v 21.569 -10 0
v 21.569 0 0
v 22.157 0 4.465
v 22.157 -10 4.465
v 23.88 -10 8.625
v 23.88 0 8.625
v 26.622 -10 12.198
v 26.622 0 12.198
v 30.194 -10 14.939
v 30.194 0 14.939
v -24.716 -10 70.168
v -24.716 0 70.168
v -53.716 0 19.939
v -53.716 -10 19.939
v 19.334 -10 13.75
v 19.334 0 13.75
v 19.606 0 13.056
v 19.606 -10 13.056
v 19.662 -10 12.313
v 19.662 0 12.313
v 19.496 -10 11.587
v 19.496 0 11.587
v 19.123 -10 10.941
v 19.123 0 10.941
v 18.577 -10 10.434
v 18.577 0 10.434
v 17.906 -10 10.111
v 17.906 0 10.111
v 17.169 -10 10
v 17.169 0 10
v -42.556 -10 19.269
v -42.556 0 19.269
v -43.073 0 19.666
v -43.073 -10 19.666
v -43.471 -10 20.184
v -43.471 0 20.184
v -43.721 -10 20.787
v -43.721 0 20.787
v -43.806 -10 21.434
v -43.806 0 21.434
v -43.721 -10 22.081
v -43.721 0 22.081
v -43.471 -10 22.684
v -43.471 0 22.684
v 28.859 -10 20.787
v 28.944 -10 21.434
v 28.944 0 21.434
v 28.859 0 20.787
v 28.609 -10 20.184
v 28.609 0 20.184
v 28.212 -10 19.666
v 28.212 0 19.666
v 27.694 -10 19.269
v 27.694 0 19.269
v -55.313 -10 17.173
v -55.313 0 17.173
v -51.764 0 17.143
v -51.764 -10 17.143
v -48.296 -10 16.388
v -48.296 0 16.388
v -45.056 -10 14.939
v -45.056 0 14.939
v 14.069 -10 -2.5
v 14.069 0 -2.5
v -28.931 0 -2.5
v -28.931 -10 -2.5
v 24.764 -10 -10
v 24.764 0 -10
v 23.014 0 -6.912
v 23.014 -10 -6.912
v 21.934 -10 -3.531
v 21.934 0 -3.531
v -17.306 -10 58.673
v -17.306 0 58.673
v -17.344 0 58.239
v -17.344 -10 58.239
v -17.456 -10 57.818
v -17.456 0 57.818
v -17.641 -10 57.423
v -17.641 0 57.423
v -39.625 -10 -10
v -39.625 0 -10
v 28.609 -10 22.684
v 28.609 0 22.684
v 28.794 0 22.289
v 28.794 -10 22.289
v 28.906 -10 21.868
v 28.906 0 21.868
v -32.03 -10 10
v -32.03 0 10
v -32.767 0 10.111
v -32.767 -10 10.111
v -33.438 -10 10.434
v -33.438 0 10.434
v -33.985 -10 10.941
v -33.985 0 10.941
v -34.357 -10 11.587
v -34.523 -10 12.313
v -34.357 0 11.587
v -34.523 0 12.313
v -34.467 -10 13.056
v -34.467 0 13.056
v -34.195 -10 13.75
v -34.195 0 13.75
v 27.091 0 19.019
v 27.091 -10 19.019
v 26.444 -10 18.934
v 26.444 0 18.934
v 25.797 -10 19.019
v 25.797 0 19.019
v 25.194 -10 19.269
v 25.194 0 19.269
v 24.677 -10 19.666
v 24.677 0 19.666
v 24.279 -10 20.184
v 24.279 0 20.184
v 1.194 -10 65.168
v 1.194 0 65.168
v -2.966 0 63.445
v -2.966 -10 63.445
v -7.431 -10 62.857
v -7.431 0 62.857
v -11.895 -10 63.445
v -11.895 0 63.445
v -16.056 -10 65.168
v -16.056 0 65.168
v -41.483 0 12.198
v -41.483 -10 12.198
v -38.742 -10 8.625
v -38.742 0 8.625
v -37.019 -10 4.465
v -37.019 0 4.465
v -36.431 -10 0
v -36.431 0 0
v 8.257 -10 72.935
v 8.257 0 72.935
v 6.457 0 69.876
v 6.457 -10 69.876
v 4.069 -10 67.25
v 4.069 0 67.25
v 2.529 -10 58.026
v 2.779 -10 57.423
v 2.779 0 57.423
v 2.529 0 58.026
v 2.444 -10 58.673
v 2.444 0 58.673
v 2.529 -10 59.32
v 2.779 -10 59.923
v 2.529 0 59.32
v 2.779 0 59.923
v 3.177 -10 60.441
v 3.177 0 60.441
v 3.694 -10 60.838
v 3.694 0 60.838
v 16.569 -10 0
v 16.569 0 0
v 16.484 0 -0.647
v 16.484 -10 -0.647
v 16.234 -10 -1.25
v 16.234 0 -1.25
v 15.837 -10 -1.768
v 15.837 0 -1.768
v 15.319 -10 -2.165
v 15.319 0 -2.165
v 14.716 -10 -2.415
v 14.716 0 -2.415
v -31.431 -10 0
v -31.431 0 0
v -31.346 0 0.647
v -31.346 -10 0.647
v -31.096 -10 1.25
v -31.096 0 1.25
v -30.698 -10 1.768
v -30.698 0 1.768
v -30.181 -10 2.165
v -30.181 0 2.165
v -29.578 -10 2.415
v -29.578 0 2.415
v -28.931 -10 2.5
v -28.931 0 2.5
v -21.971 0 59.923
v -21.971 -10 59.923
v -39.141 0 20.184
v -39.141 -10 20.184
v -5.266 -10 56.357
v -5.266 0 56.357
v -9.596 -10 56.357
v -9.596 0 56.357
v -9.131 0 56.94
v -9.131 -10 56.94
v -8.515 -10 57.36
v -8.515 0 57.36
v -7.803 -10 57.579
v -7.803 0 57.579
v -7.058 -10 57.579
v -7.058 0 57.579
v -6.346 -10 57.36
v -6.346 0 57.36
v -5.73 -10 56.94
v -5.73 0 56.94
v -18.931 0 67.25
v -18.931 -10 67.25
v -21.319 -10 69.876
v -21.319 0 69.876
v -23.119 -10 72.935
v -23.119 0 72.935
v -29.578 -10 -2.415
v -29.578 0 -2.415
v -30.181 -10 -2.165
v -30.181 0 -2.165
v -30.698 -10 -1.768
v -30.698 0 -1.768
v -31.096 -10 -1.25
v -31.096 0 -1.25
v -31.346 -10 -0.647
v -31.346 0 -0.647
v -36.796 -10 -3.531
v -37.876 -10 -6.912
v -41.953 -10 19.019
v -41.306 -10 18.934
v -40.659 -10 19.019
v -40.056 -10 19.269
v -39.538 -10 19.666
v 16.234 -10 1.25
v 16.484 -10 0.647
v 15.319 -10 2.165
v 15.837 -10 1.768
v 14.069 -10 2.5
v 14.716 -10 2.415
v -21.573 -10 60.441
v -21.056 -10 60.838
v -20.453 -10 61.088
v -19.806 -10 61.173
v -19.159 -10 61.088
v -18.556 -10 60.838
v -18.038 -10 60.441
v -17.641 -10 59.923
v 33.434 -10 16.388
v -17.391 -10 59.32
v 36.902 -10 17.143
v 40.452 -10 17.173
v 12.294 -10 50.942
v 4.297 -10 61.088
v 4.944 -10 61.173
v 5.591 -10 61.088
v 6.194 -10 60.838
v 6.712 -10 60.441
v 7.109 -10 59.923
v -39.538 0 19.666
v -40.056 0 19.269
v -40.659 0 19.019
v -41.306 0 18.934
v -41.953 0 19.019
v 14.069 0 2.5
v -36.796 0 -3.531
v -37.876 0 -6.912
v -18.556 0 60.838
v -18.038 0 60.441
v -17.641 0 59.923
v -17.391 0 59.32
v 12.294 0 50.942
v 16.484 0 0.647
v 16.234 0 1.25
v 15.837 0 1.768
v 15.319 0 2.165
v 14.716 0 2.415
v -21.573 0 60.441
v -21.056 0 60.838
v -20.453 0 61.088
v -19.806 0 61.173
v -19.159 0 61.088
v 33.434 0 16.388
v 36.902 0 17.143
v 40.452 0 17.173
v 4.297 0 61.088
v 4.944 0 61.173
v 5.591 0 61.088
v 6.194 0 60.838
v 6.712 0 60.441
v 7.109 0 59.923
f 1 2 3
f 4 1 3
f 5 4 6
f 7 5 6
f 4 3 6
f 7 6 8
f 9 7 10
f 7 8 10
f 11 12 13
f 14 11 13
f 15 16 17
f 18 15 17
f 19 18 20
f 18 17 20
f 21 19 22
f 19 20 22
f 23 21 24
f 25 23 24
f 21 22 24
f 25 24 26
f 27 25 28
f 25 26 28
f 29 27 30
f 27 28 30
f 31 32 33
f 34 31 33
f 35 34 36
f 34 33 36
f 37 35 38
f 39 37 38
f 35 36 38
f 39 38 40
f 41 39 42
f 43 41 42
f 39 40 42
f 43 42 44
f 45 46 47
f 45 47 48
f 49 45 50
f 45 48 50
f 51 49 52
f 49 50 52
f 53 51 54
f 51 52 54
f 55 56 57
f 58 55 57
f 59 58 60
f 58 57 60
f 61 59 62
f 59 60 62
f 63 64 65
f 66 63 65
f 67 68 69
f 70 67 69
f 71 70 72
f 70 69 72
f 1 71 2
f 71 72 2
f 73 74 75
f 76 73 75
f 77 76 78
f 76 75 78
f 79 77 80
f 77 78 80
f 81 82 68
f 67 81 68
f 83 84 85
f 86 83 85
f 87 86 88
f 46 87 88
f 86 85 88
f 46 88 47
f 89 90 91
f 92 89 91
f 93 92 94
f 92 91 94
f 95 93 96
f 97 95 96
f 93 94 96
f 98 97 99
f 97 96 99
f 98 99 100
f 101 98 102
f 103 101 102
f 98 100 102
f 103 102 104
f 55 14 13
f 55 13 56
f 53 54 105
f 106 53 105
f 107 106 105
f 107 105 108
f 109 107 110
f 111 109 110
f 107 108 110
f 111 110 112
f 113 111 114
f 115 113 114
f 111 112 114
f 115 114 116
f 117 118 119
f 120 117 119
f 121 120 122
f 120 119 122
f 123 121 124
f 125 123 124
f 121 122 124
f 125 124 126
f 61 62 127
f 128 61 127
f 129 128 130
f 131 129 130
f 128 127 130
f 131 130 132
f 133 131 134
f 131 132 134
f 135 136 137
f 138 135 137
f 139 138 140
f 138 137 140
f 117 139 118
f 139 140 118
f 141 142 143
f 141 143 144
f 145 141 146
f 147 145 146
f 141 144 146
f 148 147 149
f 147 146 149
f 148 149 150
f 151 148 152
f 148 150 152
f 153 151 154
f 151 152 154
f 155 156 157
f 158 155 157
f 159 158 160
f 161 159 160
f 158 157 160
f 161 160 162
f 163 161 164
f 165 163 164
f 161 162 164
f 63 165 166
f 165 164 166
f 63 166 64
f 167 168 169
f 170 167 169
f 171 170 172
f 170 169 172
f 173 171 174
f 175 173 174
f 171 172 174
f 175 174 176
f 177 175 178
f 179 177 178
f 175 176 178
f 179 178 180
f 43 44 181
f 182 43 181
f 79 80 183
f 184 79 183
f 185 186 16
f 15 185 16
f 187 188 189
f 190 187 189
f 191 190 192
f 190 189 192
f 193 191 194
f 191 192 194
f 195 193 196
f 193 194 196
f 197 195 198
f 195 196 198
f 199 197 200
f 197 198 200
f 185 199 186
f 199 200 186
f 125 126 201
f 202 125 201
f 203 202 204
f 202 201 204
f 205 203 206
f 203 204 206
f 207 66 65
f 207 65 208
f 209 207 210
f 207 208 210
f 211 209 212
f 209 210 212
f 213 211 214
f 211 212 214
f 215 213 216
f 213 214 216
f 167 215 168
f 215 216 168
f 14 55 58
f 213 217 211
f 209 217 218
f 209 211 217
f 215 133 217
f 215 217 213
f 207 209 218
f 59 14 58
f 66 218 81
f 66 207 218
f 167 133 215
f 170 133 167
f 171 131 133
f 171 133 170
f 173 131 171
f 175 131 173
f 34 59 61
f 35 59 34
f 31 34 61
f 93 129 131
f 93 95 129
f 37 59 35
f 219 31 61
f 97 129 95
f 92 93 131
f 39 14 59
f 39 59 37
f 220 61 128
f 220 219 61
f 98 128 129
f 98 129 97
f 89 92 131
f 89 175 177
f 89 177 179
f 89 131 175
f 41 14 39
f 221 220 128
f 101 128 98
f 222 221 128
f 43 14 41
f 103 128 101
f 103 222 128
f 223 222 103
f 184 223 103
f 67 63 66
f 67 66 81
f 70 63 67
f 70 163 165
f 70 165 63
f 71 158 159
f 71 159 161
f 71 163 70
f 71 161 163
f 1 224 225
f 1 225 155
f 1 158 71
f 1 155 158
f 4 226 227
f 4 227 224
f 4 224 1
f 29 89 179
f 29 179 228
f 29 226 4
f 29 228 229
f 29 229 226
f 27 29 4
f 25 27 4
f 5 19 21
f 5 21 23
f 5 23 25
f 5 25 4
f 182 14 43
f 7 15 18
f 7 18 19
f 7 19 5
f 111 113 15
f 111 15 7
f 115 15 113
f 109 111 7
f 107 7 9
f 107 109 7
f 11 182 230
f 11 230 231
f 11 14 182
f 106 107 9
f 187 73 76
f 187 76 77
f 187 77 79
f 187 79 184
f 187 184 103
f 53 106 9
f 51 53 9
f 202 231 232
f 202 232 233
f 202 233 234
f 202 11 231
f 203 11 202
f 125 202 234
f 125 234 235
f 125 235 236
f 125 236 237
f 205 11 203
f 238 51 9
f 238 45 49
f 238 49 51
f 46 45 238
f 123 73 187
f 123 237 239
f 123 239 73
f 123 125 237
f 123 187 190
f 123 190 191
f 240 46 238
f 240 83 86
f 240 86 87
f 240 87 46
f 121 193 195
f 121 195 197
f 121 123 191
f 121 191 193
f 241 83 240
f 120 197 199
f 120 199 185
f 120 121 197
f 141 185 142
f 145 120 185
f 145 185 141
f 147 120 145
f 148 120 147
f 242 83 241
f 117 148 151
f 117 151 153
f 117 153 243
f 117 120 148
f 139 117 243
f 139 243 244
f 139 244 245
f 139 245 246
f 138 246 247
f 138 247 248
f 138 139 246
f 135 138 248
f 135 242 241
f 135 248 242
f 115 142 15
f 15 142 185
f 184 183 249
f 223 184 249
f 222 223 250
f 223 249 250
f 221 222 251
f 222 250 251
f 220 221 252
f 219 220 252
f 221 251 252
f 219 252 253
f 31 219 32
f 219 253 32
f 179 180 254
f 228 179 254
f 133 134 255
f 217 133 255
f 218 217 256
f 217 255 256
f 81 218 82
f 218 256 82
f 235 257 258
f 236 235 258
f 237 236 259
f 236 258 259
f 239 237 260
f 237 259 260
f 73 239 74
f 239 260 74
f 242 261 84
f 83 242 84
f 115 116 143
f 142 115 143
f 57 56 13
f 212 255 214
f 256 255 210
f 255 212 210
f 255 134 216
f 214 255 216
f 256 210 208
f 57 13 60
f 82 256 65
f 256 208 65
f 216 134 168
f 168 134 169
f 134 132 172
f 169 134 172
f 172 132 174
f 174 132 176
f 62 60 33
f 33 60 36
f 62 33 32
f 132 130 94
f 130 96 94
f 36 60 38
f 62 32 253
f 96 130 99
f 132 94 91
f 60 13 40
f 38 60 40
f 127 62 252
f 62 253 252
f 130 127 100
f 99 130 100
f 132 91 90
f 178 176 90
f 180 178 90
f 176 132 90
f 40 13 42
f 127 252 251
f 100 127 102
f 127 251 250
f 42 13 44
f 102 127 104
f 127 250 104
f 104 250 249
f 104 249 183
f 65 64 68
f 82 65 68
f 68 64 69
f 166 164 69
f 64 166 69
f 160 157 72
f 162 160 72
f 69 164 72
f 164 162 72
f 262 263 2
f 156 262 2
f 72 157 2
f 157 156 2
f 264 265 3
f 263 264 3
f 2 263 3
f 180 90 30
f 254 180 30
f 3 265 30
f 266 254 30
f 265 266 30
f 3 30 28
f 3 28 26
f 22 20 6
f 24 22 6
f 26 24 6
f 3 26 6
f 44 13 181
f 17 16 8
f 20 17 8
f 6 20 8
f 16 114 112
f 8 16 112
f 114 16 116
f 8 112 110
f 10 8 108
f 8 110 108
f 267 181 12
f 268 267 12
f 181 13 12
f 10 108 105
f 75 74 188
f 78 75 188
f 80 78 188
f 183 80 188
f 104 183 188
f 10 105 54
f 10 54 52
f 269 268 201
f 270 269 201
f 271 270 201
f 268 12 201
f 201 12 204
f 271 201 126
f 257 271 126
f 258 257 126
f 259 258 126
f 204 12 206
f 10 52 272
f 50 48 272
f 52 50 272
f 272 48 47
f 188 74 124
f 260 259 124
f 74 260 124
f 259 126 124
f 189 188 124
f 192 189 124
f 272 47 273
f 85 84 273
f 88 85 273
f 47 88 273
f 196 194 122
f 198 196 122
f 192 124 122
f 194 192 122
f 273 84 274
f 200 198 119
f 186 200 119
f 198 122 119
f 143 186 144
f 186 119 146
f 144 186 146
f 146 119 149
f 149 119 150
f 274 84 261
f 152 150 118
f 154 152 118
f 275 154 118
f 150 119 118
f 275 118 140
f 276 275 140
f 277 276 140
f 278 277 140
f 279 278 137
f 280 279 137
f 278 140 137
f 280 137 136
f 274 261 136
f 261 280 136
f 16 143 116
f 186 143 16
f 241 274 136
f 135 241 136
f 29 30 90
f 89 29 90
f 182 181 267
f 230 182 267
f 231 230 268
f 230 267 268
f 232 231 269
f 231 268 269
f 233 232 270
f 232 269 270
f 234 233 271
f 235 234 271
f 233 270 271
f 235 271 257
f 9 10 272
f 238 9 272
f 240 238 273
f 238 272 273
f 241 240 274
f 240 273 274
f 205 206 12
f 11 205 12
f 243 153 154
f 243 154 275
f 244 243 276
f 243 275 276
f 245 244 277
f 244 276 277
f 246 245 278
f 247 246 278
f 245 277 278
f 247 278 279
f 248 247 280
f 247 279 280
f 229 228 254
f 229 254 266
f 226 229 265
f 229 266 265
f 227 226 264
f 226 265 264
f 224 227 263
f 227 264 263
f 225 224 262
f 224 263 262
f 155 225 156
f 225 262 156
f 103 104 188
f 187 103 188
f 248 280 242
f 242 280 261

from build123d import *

# Parameters (mm, degrees)
F1_DEPTH = 10


with BuildPart() as f1:
    # F0 (on Front) → F1 (new body)
    with BuildSketch(Plane.XZ):
        with BuildLine():
            ThreePointArc((-55.31313, 17.172587), (-50.010384, 16.855003), (-45.055722, 14.938938))
            Line((-45.055722, 14.938938), (-42.555722, 19.269065))
            ThreePointArc((-42.555722, 19.269065), (-43.720537, 20.787081), (-43.470786, 22.684129))
            Line((-43.470786, 22.684129), (-21.970786, 59.923221))
            ThreePointArc((-21.970786, 59.923221), (-20.45277, 61.088036), (-18.555722, 60.838285))
            Line((-18.555722, 60.838285), (-16.055722, 65.168412))
            ThreePointArc((-16.055722, 65.168412), (-20.192413, 68.501242), (-23.118823, 72.934763))
            Line((-23.118823, 72.934763), (-24.715976, 70.168412))
            Line((-24.715976, 70.168412), (-53.715976, 19.938938))
            Line((-53.715976, 19.938938), (-55.31313, 17.172587))
        make_face()
        with BuildLine():
            ThreePointArc((-45.055722, 14.938938), (-38.741784, 8.625), (-36.430722, 0))
            Line((-36.430722, 0), (-31.430722, 0))
            ThreePointArc((-31.430722, 0), (-30.698489, 1.767767), (-28.930722, 2.5))
            Line((-28.930722, 2.5), (14.069278, 2.5))
            ThreePointArc((14.069278, 2.5), (15.837045, 1.767767), (16.569278, 0))
            Line((16.569278, 0), (21.569278, 0))
            ThreePointArc((21.569278, 0), (23.88034, 8.625), (30.194278, 14.938938))
            Line((30.194278, 14.938938), (27.694278, 19.269065))
            ThreePointArc((27.694278, 19.269065), (25.79723, 19.019314), (24.279214, 20.184129))
            Line((24.279214, 20.184129), (2.779214, 57.423221))
            ThreePointArc((2.779214, 57.423221), (2.529463, 59.320269), (3.694278, 60.838285))
            Line((3.694278, 60.838285), (1.194278, 65.168412))
            ThreePointArc((1.194278, 65.168412), (-7.430722, 62.85735), (-16.055722, 65.168412))
            Line((-16.055722, 65.168412), (-18.555722, 60.838285))
            ThreePointArc((-18.555722, 60.838285), (-17.640659, 59.923221), (-17.305722, 58.673221))
            ThreePointArc((-17.305722, 58.673221), (-17.390908, 58.026173), (-17.640659, 57.423221))
            Line((-17.640659, 57.423221), (-39.140659, 20.184129))
            ThreePointArc((-39.140659, 20.184129), (-40.658674, 19.019314), (-42.555722, 19.269065))
            Line((-42.555722, 19.269065), (-45.055722, 14.938938))
        make_face()
        with BuildLine():
            Line((-34.19515, 13.75), (-9.595786, 56.357349))
            ThreePointArc((-9.595786, 56.357349), (-7.430722, 57.607349), (-5.265659, 56.357349))
            Line((-5.265659, 56.357349), (19.333706, 13.75))
            ThreePointArc((19.333706, 13.75), (19.333706, 11.25), (17.168642, 10))
            Line((17.168642, 10), (-32.030087, 10))
            ThreePointArc((-32.030087, 10), (-34.19515, 11.25), (-34.19515, 13.75))
        make_face(mode=Mode.SUBTRACT)
        with BuildLine():
            Line((27.694278, 19.269065), (30.194278, 14.938938))
            ThreePointArc((30.194278, 14.938938), (35.14894, 16.855003), (40.451686, 17.172587))
            Line((40.451686, 17.172587), (8.257378, 72.934763))
            ThreePointArc((8.257378, 72.934763), (5.330969, 68.501242), (1.194278, 65.168412))
            Line((1.194278, 65.168412), (3.694278, 60.838285))
            ThreePointArc((3.694278, 60.838285), (5.591326, 61.088036), (7.109341, 59.923221))
            Line((7.109341, 59.923221), (12.294488, 50.942284))
            Line((12.294488, 50.942284), (28.609341, 22.684129))
            ThreePointArc((28.609341, 22.684129), (28.859092, 22.081176), (28.944278, 21.434129))
            ThreePointArc((28.944278, 21.434129), (28.609341, 20.184129), (27.694278, 19.269065))
        make_face()
        with BuildLine():
            ThreePointArc((-36.430722, 0), (-37.248692, -5.248895), (-39.625029, -10))
            Line((-39.625029, -10), (24.763585, -10))
            ThreePointArc((24.763585, -10), (22.387248, -5.248895), (21.569278, 0))
            Line((21.569278, 0), (16.569278, 0))
            ThreePointArc((16.569278, 0), (15.837045, -1.767767), (14.069278, -2.5))
            Line((14.069278, -2.5), (-28.930722, -2.5))
            ThreePointArc((-28.930722, -2.5), (-30.698489, -1.767767), (-31.430722, 0))
            Line((-31.430722, 0), (-36.430722, 0))
        make_face()
    extrude(amount=F1_DEPTH)


solid = f1.part
